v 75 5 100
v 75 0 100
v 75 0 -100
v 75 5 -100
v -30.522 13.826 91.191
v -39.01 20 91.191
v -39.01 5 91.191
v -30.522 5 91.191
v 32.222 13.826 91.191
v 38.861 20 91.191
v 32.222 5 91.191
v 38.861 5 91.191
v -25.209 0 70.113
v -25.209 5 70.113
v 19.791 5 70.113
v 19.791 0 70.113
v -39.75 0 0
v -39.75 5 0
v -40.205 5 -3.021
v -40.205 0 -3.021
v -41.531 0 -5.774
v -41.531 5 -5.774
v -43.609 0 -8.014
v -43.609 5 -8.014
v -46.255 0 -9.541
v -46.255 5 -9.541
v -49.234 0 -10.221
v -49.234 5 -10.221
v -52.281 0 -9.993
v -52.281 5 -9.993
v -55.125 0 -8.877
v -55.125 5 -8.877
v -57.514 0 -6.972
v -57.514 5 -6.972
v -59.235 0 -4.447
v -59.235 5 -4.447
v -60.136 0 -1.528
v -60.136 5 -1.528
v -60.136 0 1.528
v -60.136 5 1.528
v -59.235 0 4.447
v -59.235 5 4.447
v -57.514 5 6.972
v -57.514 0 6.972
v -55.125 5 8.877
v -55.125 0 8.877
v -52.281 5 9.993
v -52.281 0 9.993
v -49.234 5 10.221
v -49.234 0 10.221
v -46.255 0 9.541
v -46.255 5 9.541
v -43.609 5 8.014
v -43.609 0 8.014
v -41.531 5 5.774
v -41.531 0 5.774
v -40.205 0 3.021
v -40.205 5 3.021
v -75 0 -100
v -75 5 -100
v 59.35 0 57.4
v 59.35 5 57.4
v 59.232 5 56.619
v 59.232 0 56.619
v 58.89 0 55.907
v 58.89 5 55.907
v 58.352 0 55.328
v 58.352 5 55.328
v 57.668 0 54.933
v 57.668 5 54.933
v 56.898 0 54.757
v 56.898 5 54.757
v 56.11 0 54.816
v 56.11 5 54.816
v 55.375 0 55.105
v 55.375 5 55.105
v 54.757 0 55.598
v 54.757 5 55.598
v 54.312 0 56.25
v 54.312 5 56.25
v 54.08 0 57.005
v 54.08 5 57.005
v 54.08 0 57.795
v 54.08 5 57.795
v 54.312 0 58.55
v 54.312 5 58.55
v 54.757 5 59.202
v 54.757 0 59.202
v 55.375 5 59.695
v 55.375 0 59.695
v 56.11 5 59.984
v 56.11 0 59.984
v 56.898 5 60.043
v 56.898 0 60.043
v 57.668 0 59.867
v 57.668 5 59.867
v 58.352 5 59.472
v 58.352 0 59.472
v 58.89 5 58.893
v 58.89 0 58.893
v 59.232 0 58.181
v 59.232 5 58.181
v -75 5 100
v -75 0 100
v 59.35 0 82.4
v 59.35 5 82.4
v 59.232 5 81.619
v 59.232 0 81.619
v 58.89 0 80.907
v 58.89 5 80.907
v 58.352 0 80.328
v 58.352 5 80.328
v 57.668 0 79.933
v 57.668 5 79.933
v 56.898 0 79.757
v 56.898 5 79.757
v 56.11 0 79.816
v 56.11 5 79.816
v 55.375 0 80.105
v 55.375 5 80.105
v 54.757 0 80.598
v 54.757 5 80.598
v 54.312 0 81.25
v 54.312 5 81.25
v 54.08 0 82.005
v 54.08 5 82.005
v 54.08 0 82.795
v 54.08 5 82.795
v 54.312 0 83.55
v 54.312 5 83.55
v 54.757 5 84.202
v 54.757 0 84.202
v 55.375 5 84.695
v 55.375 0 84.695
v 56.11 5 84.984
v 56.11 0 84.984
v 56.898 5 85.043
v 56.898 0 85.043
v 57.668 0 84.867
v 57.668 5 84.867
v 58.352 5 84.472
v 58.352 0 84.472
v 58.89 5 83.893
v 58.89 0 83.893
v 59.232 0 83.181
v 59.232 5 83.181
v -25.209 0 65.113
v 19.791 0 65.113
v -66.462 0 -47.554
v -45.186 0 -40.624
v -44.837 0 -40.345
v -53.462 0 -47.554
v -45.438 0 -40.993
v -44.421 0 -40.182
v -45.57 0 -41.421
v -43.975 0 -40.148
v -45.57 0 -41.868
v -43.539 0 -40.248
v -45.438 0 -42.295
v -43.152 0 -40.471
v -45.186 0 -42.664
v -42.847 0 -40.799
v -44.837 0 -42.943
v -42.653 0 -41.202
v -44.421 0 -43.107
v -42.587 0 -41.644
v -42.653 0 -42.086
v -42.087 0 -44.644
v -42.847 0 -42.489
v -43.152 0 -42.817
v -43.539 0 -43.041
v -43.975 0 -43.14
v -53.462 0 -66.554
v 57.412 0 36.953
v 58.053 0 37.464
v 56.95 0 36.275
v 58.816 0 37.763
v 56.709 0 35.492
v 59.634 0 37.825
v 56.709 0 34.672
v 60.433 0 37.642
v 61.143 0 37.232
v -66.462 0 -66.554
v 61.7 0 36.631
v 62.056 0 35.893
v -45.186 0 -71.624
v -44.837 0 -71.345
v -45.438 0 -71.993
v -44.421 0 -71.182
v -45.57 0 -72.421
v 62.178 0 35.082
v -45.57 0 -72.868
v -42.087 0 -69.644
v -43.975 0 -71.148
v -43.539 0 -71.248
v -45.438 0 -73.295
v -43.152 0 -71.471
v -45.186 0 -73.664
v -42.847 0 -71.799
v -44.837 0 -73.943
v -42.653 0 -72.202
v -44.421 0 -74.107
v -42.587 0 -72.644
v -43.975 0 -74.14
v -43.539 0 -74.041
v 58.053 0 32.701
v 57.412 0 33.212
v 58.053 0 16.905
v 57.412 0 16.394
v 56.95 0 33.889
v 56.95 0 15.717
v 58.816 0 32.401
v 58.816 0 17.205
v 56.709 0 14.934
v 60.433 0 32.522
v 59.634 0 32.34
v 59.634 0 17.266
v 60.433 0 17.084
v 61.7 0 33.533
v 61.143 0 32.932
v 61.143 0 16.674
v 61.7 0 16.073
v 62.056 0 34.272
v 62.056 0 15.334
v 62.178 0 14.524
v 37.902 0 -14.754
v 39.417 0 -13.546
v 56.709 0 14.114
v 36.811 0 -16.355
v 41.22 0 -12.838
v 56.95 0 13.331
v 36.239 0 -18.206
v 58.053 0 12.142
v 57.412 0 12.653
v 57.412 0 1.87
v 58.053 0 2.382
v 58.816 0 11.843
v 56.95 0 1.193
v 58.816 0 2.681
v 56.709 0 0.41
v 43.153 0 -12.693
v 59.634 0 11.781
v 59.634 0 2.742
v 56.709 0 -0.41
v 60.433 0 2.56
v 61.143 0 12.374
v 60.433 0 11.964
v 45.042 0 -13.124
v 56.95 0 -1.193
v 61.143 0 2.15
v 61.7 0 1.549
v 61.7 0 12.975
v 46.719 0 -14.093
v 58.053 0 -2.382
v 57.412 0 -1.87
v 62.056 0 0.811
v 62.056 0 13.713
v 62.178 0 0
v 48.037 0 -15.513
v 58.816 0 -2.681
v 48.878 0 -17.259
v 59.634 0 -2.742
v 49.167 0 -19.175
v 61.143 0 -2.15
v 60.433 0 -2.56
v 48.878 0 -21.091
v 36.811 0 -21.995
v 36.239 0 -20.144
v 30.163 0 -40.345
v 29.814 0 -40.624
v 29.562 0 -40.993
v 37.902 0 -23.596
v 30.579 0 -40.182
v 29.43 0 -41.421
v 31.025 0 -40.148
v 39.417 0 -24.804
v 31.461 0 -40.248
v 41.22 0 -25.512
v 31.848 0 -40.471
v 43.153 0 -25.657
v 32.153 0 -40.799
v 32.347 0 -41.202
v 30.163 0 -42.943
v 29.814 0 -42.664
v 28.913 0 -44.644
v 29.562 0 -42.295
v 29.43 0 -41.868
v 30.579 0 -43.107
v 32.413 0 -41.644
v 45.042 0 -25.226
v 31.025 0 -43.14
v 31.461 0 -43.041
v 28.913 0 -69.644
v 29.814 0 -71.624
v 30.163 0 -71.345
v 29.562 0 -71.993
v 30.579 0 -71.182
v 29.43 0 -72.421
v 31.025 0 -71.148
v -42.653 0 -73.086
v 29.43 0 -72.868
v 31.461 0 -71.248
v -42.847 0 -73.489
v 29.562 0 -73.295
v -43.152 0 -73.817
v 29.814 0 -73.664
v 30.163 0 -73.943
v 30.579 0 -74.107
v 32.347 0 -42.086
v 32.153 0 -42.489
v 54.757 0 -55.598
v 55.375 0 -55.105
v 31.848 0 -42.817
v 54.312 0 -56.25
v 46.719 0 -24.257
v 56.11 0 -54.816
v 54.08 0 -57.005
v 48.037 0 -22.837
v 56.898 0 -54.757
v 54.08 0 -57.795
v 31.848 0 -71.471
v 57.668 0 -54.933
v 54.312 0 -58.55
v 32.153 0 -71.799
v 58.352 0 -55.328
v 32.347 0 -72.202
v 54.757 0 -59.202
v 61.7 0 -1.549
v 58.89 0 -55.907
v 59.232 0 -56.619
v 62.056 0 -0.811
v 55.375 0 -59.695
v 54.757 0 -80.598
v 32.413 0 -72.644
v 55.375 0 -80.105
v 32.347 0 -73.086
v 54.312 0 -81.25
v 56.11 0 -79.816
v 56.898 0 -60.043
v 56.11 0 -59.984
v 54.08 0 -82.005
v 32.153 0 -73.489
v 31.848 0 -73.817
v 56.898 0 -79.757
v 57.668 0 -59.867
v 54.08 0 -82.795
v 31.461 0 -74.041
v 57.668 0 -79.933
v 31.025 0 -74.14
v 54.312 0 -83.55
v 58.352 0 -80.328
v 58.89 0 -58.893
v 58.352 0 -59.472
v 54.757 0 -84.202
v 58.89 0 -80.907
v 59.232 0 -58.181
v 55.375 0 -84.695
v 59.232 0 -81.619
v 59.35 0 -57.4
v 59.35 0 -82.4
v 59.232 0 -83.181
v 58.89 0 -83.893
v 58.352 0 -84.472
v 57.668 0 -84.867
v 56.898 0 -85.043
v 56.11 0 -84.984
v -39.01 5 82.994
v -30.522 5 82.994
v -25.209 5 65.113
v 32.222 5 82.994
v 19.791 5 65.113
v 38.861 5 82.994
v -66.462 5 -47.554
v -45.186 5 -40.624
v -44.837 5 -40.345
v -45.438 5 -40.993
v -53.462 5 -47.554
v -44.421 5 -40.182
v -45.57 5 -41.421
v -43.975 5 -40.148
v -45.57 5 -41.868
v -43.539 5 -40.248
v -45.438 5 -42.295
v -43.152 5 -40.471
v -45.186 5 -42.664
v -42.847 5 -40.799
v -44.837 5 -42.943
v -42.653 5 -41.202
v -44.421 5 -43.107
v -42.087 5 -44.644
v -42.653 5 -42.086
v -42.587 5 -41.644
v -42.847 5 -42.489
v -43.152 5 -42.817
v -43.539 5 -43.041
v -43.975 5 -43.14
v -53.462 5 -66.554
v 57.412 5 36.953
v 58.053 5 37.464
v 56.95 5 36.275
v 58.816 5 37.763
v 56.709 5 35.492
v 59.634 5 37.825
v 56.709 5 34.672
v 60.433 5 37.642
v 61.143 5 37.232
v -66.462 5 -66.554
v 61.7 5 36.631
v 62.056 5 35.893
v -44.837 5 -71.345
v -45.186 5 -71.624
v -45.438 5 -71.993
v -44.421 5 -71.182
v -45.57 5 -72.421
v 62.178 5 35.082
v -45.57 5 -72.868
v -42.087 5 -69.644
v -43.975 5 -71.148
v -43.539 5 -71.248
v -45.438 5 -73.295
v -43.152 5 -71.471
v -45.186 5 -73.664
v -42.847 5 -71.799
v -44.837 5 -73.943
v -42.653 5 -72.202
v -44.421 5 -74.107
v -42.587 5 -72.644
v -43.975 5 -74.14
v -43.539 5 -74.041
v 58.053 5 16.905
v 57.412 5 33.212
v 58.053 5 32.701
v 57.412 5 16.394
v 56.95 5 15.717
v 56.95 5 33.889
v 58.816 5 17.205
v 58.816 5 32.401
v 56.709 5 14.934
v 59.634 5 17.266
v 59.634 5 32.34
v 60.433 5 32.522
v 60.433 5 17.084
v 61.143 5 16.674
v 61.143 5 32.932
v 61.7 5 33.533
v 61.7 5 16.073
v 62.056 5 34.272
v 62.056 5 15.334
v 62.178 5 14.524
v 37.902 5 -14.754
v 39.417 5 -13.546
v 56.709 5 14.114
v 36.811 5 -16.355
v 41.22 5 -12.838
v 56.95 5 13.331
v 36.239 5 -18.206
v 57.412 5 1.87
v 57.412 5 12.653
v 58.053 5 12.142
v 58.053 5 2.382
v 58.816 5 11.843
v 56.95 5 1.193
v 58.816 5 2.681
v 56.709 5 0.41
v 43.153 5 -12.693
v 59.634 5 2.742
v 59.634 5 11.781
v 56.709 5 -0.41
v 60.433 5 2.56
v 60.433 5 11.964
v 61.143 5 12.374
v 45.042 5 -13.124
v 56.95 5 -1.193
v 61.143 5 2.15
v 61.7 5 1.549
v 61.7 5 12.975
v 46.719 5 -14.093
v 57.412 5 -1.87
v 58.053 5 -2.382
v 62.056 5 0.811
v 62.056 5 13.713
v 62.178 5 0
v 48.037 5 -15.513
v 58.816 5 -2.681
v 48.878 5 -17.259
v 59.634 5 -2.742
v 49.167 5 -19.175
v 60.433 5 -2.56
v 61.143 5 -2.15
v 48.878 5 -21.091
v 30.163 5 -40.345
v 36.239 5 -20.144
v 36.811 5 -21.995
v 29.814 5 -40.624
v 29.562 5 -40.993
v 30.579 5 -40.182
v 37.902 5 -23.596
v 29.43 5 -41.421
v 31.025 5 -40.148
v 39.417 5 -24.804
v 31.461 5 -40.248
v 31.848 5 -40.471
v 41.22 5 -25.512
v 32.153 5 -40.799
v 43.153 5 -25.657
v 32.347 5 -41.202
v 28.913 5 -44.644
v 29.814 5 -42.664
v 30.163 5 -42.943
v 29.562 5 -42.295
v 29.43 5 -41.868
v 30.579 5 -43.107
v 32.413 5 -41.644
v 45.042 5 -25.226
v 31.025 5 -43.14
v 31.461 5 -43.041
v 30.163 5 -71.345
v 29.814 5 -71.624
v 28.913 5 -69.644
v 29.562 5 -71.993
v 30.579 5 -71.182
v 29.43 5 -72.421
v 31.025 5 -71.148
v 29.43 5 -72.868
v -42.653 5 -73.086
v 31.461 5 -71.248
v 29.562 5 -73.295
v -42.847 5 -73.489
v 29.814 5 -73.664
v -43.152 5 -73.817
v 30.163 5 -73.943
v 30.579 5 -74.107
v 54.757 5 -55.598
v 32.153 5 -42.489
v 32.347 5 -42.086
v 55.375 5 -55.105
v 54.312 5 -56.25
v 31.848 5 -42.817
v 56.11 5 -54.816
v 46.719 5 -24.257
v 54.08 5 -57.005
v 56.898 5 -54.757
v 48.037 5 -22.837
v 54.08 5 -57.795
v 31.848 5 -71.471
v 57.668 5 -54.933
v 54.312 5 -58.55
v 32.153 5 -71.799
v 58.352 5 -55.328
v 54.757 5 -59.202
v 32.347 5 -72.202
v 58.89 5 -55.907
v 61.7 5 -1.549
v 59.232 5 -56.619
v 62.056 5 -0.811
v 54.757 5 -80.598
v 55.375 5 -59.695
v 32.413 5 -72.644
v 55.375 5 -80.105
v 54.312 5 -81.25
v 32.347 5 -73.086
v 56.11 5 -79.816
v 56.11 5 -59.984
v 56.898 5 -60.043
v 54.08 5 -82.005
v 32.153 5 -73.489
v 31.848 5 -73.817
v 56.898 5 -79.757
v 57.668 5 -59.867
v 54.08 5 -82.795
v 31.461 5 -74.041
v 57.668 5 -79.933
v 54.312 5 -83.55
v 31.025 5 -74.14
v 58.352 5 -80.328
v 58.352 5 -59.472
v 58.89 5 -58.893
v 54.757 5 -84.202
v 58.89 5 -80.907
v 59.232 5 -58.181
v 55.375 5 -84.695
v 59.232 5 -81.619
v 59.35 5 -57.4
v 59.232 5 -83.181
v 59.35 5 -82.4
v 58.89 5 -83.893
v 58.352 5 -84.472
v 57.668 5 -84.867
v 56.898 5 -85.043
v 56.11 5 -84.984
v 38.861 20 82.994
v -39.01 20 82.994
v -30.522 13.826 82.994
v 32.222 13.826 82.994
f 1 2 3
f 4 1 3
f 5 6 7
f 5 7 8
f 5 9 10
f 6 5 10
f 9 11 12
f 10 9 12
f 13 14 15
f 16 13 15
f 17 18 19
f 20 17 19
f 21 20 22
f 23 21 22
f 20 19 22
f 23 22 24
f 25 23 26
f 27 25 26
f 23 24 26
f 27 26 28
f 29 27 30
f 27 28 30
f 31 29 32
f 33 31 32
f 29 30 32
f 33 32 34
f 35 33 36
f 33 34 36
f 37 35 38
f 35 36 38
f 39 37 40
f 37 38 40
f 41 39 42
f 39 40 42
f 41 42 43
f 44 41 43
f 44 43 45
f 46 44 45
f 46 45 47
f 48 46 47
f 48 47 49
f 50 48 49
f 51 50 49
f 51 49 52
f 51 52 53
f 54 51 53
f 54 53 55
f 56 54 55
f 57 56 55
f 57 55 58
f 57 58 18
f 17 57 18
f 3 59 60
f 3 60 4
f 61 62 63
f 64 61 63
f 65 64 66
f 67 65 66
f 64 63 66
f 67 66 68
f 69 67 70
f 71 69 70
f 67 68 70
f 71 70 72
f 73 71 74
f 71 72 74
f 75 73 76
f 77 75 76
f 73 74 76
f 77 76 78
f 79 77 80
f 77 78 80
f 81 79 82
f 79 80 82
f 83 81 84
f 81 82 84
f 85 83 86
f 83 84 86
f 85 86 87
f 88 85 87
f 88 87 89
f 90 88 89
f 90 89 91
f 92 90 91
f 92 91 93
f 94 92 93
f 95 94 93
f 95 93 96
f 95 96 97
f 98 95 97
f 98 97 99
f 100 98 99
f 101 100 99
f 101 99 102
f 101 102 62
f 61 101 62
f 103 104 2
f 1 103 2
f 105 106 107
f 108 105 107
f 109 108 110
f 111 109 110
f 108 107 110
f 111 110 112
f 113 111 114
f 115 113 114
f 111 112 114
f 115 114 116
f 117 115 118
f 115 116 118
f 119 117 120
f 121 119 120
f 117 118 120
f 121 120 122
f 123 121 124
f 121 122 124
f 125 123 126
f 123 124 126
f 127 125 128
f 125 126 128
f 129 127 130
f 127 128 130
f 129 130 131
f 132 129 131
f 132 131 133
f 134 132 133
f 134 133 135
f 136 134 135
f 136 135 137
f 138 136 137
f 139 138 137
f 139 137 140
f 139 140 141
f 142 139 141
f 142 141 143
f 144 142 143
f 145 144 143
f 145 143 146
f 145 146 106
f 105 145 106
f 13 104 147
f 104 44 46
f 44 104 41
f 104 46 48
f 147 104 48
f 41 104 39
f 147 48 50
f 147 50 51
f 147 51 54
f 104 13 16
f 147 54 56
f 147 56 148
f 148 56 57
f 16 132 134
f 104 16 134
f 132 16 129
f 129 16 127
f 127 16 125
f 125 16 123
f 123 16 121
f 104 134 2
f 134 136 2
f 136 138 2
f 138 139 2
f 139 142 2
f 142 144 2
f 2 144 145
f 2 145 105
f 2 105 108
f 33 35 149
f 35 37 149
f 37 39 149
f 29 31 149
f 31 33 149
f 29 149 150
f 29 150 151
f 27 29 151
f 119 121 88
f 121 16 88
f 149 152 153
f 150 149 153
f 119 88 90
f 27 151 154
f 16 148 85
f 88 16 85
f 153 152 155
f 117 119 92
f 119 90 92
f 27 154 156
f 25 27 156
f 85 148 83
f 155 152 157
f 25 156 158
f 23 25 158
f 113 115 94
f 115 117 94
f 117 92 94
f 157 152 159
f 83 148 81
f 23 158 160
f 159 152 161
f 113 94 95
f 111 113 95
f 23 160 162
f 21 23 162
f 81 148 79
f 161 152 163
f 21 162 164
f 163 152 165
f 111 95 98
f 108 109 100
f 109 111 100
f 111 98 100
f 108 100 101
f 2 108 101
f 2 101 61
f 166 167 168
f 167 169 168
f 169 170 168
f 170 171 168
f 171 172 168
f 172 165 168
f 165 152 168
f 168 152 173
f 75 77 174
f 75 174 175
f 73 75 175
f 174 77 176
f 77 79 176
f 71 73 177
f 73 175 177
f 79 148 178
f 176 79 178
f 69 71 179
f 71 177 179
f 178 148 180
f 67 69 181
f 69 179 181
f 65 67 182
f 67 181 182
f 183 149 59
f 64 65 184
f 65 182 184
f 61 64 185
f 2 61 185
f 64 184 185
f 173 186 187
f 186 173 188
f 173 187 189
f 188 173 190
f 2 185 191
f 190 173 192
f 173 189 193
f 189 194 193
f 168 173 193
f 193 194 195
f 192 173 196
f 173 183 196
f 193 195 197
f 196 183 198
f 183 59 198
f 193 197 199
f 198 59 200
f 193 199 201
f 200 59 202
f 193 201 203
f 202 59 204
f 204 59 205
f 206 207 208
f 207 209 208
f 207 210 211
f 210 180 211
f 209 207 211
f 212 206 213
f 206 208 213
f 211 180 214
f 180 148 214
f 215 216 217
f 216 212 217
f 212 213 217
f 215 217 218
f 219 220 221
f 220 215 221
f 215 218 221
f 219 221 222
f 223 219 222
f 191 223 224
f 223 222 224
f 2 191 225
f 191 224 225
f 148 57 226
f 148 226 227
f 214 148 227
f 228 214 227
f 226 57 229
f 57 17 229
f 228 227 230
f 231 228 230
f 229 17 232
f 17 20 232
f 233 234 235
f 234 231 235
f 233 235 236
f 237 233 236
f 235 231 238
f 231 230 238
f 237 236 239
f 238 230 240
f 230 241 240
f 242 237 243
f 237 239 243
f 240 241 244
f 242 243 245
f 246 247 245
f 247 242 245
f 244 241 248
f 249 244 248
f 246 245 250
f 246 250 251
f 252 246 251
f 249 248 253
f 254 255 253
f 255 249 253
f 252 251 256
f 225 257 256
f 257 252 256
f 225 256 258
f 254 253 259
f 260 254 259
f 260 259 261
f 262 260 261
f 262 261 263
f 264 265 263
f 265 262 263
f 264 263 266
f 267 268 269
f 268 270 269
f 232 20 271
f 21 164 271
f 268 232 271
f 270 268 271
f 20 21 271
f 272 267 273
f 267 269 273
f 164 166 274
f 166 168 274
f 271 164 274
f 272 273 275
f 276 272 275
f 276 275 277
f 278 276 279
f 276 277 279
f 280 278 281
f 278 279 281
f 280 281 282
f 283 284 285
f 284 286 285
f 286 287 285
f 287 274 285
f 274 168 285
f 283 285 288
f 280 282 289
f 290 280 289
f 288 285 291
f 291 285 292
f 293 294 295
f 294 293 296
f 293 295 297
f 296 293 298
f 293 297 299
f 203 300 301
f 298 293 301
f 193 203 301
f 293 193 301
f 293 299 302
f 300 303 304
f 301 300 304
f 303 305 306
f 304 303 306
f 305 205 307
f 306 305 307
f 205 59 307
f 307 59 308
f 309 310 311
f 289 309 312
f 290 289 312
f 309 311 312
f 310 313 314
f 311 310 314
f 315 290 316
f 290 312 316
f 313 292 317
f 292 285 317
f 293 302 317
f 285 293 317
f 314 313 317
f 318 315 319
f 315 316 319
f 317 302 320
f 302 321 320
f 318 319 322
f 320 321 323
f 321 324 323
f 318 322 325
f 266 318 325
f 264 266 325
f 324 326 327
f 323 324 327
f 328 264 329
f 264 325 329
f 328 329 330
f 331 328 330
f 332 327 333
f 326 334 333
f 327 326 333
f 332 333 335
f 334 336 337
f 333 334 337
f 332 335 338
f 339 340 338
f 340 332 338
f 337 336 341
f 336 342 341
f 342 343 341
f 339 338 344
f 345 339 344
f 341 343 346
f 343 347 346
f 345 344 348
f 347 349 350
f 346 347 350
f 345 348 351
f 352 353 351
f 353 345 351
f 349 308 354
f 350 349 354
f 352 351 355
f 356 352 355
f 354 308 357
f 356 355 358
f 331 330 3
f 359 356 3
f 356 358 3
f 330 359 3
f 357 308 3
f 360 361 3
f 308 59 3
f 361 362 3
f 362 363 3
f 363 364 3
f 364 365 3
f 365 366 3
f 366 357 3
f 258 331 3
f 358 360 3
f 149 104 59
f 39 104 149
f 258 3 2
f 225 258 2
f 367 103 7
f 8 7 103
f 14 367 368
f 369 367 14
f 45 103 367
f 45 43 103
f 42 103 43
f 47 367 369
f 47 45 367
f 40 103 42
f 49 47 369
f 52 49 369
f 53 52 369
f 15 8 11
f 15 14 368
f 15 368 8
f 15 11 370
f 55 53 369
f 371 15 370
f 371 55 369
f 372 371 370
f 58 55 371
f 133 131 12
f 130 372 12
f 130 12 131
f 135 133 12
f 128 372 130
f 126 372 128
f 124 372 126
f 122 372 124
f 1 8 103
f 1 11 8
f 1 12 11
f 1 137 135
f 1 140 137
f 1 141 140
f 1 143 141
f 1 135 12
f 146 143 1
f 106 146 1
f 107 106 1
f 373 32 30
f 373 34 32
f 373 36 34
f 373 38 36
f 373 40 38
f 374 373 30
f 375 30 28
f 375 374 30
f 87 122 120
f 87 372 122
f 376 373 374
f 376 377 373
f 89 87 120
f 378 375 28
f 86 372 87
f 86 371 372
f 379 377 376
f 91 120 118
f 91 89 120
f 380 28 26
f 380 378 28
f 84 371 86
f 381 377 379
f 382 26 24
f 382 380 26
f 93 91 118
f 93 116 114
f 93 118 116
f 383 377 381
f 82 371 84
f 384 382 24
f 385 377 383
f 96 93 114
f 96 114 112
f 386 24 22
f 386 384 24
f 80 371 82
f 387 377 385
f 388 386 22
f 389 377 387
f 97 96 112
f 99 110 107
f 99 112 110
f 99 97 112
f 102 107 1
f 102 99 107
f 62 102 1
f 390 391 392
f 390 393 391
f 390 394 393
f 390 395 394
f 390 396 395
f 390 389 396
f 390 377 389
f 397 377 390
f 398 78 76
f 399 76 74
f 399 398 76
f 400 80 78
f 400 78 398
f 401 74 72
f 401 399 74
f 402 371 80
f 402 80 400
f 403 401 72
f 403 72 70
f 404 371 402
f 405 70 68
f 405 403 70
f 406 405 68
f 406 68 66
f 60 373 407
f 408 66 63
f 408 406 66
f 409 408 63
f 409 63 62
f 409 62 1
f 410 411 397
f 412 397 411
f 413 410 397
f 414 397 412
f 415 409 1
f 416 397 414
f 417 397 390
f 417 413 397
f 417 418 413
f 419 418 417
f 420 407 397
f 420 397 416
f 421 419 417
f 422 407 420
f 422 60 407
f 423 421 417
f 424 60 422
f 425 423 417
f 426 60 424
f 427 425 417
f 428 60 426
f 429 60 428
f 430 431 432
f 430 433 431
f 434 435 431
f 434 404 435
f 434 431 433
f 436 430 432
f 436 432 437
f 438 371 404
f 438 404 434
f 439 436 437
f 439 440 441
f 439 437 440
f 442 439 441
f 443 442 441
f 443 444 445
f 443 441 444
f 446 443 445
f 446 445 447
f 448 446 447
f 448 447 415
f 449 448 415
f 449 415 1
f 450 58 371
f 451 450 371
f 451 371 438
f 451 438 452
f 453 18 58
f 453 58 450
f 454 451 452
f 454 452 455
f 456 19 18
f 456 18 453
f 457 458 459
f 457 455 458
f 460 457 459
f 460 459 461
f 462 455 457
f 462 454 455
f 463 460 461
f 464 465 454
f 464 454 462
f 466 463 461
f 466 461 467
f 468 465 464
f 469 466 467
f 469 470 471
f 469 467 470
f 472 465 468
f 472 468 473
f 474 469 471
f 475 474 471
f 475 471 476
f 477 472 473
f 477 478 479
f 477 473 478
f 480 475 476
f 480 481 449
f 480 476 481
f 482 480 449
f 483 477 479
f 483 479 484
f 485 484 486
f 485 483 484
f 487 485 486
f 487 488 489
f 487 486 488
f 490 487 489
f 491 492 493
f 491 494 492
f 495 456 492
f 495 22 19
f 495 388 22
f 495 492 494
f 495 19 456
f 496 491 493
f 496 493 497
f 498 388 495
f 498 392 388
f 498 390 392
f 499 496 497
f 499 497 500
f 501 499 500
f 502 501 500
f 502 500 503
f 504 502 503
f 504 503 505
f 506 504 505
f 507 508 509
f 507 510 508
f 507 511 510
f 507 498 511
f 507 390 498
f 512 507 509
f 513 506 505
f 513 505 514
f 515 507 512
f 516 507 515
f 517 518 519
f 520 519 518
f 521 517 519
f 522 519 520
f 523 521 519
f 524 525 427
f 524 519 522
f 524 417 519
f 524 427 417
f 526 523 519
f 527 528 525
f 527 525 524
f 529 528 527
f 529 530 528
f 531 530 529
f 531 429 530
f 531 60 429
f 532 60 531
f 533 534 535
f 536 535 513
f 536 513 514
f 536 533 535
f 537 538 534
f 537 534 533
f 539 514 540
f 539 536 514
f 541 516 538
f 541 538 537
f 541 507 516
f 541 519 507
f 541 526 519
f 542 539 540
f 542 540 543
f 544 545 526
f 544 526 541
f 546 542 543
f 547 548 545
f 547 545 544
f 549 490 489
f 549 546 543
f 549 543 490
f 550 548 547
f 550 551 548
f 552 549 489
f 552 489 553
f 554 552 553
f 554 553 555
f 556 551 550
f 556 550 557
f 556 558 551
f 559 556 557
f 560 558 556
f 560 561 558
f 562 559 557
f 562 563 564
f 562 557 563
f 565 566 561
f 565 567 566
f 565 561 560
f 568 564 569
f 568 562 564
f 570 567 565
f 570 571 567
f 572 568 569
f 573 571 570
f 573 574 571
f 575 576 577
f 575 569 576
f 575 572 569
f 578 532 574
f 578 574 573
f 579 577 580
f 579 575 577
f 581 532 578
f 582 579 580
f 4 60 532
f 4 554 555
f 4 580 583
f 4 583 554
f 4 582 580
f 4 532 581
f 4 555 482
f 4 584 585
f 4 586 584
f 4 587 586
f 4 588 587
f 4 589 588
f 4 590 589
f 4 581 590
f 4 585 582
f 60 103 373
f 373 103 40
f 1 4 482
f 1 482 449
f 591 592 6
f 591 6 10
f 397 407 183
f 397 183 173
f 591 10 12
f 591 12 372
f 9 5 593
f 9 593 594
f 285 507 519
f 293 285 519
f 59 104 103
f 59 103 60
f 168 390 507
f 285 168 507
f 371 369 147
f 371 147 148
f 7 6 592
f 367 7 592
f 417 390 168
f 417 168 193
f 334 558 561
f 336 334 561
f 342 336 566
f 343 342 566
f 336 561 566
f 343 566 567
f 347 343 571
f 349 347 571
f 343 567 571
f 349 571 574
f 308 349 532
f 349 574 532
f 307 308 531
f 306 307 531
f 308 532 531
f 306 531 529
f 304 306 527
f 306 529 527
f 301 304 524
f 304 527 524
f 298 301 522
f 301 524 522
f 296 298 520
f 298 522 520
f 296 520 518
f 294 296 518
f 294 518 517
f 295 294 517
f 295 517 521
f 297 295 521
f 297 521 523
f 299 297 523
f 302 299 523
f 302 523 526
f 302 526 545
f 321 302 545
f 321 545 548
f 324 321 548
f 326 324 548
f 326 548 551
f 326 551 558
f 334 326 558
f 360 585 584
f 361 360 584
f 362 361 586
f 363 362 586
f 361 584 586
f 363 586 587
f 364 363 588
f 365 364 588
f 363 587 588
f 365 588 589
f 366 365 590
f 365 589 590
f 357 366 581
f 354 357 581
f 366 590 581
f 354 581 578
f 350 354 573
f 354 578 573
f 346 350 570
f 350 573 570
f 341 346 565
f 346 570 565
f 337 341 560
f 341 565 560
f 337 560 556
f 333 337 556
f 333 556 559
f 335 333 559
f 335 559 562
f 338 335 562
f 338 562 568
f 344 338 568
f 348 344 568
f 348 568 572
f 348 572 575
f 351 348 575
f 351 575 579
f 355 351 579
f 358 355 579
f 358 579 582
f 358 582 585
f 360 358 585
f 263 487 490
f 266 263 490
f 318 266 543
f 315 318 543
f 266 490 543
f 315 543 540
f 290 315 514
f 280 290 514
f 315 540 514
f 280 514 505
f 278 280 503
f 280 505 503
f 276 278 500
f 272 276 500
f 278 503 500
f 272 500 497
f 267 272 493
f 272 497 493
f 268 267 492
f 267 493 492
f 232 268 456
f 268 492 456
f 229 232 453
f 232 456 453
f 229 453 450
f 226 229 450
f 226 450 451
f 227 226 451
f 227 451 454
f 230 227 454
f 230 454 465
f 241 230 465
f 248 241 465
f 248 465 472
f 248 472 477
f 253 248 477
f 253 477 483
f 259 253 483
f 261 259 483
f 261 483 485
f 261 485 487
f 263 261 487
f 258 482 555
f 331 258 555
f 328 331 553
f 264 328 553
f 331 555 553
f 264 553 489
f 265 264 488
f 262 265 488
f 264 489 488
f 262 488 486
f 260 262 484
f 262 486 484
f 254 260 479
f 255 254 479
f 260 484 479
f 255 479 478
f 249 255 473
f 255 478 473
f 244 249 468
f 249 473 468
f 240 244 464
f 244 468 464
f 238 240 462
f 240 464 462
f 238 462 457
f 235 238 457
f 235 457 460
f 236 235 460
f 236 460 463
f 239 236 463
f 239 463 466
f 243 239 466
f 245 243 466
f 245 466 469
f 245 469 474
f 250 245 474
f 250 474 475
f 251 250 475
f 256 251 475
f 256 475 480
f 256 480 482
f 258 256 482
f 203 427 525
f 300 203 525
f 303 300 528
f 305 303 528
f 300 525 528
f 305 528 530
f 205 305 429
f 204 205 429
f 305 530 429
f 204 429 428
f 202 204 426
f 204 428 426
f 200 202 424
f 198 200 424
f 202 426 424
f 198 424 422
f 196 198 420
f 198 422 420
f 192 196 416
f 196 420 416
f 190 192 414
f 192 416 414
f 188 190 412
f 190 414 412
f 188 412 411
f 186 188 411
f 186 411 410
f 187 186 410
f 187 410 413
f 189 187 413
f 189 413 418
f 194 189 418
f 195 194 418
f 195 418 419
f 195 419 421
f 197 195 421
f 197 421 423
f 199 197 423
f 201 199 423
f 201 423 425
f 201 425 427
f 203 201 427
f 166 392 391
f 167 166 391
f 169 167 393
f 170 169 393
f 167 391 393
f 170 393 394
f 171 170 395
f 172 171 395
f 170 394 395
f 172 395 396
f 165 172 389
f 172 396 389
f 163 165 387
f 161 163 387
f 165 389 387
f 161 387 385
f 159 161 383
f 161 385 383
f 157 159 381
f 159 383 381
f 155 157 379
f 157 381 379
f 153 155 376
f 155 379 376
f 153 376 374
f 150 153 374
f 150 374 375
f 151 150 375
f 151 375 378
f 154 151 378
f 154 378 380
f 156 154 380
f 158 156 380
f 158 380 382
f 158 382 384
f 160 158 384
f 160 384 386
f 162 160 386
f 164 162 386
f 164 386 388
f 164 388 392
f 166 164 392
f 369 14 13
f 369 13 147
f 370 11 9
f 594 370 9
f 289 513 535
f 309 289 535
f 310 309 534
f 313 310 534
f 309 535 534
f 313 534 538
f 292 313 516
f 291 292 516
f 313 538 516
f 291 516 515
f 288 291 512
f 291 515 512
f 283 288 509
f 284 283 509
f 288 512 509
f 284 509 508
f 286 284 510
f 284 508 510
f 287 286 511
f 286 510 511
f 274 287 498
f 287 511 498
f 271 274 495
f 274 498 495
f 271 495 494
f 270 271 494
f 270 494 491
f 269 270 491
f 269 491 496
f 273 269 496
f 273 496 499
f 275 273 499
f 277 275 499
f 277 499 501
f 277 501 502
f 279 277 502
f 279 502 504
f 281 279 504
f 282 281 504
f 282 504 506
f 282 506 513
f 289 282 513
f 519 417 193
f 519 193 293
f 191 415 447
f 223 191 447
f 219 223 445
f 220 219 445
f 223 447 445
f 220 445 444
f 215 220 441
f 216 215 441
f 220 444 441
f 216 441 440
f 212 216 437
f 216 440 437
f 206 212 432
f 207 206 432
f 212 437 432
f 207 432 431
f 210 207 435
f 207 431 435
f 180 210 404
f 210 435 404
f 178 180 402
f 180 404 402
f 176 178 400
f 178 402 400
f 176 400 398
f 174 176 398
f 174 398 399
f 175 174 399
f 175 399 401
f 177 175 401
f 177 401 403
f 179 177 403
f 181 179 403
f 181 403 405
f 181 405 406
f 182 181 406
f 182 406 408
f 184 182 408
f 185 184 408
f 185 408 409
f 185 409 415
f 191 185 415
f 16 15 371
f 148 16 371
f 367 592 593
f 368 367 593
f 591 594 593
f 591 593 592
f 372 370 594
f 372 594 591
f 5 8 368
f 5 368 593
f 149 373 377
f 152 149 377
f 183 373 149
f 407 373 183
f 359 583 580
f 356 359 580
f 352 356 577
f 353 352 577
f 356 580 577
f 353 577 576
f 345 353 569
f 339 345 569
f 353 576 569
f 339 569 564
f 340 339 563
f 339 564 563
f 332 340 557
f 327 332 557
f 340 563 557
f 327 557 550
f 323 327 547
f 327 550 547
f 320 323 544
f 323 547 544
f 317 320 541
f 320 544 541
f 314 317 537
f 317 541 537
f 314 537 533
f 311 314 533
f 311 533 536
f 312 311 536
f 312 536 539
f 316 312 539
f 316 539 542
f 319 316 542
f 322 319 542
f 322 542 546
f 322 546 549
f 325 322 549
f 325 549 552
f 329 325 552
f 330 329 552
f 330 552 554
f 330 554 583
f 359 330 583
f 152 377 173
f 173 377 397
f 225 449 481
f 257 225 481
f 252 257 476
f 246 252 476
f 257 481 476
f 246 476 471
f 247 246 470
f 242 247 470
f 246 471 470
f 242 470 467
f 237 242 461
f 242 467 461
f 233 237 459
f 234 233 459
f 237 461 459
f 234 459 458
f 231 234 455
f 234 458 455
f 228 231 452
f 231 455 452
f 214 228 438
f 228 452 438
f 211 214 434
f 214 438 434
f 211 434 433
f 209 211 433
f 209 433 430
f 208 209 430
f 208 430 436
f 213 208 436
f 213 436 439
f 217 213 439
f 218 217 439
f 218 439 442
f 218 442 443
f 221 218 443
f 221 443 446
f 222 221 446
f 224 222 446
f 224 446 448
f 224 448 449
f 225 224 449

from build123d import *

# Parameters (mm, degrees)
SKETCH1_W           = 150
SKETCH1_H           = 200
BOSS_EXTRUDE1_DEPTH = 5
CUT_EXTRUDE1_REACH  = 7
SKETCH2_R           = 10.25
SKETCH2_R_2         = 2.65
SKETCH3_R           = 1.5
SKETCH3_R_2         = 6.5
SKETCH3_R_3         = 2.75
SKETCH3_W           = 71
SKETCH3_H           = 25
SKETCH3_W_2         = 45
SKETCH3_H_2         = 5
SKETCH3_W_3         = 13
SKETCH3_H_3         = 19
CUT_EXTRUDE2_DEPTH  = 10
SKETCH4_W           = 77.871217223
SKETCH4_H           = 8.196970234
BOSS_EXTRUDE2_DEPTH = 15
SKETCH5_W           = 62.74414778
SKETCH5_H           = 8.82586267
CUT_EXTRUDE3_DEPTH  = 15


with BuildPart() as part:
    # Sketch1 → Boss-Extrude1 (new body)
    with BuildSketch(Plane(origin=(0, 0, 0), x_dir=(1, 0, 0), z_dir=(0, 1, 0))):
        Rectangle(SKETCH1_W, SKETCH1_H)
    extrude(amount=BOSS_EXTRUDE1_DEPTH)

    # Sketch2 → Cut-Extrude1 (cut, up to next)
    with BuildSketch(Plane(origin=(0, 5, 0), x_dir=(1, 0, 0), z_dir=(0, 1, 0)), mode=Mode.PRIVATE) as cut_extrude1_sk1:
        with Locations((-50, 0)):
            Circle(SKETCH2_R)
    cut_extrude1_tool1 = extrude(cut_extrude1_sk1.sketch, amount=-CUT_EXTRUDE1_REACH, mode=Mode.PRIVATE) & part.part
    add(cut_extrude1_tool1.solids().sort_by_distance((-50, 5, 0))[0], mode=Mode.SUBTRACT)
    # Sketch2 → Cut-Extrude1 (cut, up to next)
    with BuildSketch(Plane(origin=(0, 5, 0), x_dir=(1, 0, 0), z_dir=(0, 1, 0)), mode=Mode.PRIVATE) as cut_extrude1_sk2:
        with Locations((56.7, 82.4)):
            Circle(SKETCH2_R_2)
    cut_extrude1_tool2 = extrude(cut_extrude1_sk2.sketch, amount=-CUT_EXTRUDE1_REACH, mode=Mode.PRIVATE) & part.part
    add(cut_extrude1_tool2.solids().sort_by_distance((56.7, 5, -82.4))[0], mode=Mode.SUBTRACT)
    # Sketch2 → Cut-Extrude1 (cut, up to next)
    with BuildSketch(Plane(origin=(0, 5, 0), x_dir=(1, 0, 0), z_dir=(0, 1, 0)), mode=Mode.PRIVATE) as cut_extrude1_sk3:
        with Locations((56.7, 57.4)):
            Circle(SKETCH2_R_2)
    cut_extrude1_tool3 = extrude(cut_extrude1_sk3.sketch, amount=-CUT_EXTRUDE1_REACH, mode=Mode.PRIVATE) & part.part
    add(cut_extrude1_tool3.solids().sort_by_distance((56.7, 5, -57.4))[0], mode=Mode.SUBTRACT)
    # Sketch2 → Cut-Extrude1 (cut, up to next)
    with BuildSketch(Plane(origin=(0, 5, 0), x_dir=(1, 0, 0), z_dir=(0, 1, 0)), mode=Mode.PRIVATE) as cut_extrude1_sk4:
        with Locations((56.7, -57.4)):
            Circle(SKETCH2_R_2)
    cut_extrude1_tool4 = extrude(cut_extrude1_sk4.sketch, amount=-CUT_EXTRUDE1_REACH, mode=Mode.PRIVATE) & part.part
    add(cut_extrude1_tool4.solids().sort_by_distance((56.7, 5, 57.4))[0], mode=Mode.SUBTRACT)
    # Sketch2 → Cut-Extrude1 (cut, up to next)
    with BuildSketch(Plane(origin=(0, 5, 0), x_dir=(1, 0, 0), z_dir=(0, 1, 0)), mode=Mode.PRIVATE) as cut_extrude1_sk5:
        with Locations((56.7, -82.4)):
            Circle(SKETCH2_R_2)
    cut_extrude1_tool5 = extrude(cut_extrude1_sk5.sketch, amount=-CUT_EXTRUDE1_REACH, mode=Mode.PRIVATE) & part.part
    add(cut_extrude1_tool5.solids().sort_by_distance((56.7, 5, 82.4))[0], mode=Mode.SUBTRACT)

    # Sketch3 → Cut-Extrude2 (cut)
    with BuildSketch(Plane(origin=(0, 5, 0), x_dir=(1, 0, 0), z_dir=(0, 1, 0))):
        with Locations((-44.086851081, 72.644212882)):
            Circle(SKETCH3_R)
        with Locations((-44.086851081, 41.644212882)):
            Circle(SKETCH3_R)
        with Locations((30.913148919, 72.644212882)):
            Circle(SKETCH3_R)
        with Locations((30.913148919, 41.644212882)):
            Circle(SKETCH3_R)
        with Locations((42.666816073, 19.175055369)):
            Circle(SKETCH3_R_2)
        with Locations((59.428143187, 0)):
            Circle(SKETCH3_R_3)
        with Locations((59.428143187, -14.52369357)):
            Circle(SKETCH3_R_3)
        with Locations((59.428143187, -35.082227639)):
            Circle(SKETCH3_R_3)
        with Locations((-6.586851081, 57.144212882)):
            Rectangle(SKETCH3_W, SKETCH3_H)
        with Locations((-2.709269151, -67.613370395)):
            Rectangle(SKETCH3_W_2, SKETCH3_H_2)
        with Locations((-59.961970151, 57.054006432)):
            Rectangle(SKETCH3_W_3, SKETCH3_H_3)
    extrude(amount=-CUT_EXTRUDE2_DEPTH, mode=Mode.SUBTRACT)

    # Sketch4 → Boss-Extrude2 (add)
    with BuildSketch(Plane(origin=(0, 5, 0), x_dir=(1, 0, 0), z_dir=(0, 1, 0))):
        with Locations((-0.074528718, -87.092808737)):
            Rectangle(SKETCH4_W, SKETCH4_H)
    extrude(amount=BOSS_EXTRUDE2_DEPTH)

    # Sketch5 → Cut-Extrude3 (cut)
    with BuildSketch(Plane.XY.offset(91.191293854)):
        with Locations((0.850191704, 9.412931335)):
            Rectangle(SKETCH5_W, SKETCH5_H)
    extrude(amount=-CUT_EXTRUDE3_DEPTH, mode=Mode.SUBTRACT)


solid = part.part
